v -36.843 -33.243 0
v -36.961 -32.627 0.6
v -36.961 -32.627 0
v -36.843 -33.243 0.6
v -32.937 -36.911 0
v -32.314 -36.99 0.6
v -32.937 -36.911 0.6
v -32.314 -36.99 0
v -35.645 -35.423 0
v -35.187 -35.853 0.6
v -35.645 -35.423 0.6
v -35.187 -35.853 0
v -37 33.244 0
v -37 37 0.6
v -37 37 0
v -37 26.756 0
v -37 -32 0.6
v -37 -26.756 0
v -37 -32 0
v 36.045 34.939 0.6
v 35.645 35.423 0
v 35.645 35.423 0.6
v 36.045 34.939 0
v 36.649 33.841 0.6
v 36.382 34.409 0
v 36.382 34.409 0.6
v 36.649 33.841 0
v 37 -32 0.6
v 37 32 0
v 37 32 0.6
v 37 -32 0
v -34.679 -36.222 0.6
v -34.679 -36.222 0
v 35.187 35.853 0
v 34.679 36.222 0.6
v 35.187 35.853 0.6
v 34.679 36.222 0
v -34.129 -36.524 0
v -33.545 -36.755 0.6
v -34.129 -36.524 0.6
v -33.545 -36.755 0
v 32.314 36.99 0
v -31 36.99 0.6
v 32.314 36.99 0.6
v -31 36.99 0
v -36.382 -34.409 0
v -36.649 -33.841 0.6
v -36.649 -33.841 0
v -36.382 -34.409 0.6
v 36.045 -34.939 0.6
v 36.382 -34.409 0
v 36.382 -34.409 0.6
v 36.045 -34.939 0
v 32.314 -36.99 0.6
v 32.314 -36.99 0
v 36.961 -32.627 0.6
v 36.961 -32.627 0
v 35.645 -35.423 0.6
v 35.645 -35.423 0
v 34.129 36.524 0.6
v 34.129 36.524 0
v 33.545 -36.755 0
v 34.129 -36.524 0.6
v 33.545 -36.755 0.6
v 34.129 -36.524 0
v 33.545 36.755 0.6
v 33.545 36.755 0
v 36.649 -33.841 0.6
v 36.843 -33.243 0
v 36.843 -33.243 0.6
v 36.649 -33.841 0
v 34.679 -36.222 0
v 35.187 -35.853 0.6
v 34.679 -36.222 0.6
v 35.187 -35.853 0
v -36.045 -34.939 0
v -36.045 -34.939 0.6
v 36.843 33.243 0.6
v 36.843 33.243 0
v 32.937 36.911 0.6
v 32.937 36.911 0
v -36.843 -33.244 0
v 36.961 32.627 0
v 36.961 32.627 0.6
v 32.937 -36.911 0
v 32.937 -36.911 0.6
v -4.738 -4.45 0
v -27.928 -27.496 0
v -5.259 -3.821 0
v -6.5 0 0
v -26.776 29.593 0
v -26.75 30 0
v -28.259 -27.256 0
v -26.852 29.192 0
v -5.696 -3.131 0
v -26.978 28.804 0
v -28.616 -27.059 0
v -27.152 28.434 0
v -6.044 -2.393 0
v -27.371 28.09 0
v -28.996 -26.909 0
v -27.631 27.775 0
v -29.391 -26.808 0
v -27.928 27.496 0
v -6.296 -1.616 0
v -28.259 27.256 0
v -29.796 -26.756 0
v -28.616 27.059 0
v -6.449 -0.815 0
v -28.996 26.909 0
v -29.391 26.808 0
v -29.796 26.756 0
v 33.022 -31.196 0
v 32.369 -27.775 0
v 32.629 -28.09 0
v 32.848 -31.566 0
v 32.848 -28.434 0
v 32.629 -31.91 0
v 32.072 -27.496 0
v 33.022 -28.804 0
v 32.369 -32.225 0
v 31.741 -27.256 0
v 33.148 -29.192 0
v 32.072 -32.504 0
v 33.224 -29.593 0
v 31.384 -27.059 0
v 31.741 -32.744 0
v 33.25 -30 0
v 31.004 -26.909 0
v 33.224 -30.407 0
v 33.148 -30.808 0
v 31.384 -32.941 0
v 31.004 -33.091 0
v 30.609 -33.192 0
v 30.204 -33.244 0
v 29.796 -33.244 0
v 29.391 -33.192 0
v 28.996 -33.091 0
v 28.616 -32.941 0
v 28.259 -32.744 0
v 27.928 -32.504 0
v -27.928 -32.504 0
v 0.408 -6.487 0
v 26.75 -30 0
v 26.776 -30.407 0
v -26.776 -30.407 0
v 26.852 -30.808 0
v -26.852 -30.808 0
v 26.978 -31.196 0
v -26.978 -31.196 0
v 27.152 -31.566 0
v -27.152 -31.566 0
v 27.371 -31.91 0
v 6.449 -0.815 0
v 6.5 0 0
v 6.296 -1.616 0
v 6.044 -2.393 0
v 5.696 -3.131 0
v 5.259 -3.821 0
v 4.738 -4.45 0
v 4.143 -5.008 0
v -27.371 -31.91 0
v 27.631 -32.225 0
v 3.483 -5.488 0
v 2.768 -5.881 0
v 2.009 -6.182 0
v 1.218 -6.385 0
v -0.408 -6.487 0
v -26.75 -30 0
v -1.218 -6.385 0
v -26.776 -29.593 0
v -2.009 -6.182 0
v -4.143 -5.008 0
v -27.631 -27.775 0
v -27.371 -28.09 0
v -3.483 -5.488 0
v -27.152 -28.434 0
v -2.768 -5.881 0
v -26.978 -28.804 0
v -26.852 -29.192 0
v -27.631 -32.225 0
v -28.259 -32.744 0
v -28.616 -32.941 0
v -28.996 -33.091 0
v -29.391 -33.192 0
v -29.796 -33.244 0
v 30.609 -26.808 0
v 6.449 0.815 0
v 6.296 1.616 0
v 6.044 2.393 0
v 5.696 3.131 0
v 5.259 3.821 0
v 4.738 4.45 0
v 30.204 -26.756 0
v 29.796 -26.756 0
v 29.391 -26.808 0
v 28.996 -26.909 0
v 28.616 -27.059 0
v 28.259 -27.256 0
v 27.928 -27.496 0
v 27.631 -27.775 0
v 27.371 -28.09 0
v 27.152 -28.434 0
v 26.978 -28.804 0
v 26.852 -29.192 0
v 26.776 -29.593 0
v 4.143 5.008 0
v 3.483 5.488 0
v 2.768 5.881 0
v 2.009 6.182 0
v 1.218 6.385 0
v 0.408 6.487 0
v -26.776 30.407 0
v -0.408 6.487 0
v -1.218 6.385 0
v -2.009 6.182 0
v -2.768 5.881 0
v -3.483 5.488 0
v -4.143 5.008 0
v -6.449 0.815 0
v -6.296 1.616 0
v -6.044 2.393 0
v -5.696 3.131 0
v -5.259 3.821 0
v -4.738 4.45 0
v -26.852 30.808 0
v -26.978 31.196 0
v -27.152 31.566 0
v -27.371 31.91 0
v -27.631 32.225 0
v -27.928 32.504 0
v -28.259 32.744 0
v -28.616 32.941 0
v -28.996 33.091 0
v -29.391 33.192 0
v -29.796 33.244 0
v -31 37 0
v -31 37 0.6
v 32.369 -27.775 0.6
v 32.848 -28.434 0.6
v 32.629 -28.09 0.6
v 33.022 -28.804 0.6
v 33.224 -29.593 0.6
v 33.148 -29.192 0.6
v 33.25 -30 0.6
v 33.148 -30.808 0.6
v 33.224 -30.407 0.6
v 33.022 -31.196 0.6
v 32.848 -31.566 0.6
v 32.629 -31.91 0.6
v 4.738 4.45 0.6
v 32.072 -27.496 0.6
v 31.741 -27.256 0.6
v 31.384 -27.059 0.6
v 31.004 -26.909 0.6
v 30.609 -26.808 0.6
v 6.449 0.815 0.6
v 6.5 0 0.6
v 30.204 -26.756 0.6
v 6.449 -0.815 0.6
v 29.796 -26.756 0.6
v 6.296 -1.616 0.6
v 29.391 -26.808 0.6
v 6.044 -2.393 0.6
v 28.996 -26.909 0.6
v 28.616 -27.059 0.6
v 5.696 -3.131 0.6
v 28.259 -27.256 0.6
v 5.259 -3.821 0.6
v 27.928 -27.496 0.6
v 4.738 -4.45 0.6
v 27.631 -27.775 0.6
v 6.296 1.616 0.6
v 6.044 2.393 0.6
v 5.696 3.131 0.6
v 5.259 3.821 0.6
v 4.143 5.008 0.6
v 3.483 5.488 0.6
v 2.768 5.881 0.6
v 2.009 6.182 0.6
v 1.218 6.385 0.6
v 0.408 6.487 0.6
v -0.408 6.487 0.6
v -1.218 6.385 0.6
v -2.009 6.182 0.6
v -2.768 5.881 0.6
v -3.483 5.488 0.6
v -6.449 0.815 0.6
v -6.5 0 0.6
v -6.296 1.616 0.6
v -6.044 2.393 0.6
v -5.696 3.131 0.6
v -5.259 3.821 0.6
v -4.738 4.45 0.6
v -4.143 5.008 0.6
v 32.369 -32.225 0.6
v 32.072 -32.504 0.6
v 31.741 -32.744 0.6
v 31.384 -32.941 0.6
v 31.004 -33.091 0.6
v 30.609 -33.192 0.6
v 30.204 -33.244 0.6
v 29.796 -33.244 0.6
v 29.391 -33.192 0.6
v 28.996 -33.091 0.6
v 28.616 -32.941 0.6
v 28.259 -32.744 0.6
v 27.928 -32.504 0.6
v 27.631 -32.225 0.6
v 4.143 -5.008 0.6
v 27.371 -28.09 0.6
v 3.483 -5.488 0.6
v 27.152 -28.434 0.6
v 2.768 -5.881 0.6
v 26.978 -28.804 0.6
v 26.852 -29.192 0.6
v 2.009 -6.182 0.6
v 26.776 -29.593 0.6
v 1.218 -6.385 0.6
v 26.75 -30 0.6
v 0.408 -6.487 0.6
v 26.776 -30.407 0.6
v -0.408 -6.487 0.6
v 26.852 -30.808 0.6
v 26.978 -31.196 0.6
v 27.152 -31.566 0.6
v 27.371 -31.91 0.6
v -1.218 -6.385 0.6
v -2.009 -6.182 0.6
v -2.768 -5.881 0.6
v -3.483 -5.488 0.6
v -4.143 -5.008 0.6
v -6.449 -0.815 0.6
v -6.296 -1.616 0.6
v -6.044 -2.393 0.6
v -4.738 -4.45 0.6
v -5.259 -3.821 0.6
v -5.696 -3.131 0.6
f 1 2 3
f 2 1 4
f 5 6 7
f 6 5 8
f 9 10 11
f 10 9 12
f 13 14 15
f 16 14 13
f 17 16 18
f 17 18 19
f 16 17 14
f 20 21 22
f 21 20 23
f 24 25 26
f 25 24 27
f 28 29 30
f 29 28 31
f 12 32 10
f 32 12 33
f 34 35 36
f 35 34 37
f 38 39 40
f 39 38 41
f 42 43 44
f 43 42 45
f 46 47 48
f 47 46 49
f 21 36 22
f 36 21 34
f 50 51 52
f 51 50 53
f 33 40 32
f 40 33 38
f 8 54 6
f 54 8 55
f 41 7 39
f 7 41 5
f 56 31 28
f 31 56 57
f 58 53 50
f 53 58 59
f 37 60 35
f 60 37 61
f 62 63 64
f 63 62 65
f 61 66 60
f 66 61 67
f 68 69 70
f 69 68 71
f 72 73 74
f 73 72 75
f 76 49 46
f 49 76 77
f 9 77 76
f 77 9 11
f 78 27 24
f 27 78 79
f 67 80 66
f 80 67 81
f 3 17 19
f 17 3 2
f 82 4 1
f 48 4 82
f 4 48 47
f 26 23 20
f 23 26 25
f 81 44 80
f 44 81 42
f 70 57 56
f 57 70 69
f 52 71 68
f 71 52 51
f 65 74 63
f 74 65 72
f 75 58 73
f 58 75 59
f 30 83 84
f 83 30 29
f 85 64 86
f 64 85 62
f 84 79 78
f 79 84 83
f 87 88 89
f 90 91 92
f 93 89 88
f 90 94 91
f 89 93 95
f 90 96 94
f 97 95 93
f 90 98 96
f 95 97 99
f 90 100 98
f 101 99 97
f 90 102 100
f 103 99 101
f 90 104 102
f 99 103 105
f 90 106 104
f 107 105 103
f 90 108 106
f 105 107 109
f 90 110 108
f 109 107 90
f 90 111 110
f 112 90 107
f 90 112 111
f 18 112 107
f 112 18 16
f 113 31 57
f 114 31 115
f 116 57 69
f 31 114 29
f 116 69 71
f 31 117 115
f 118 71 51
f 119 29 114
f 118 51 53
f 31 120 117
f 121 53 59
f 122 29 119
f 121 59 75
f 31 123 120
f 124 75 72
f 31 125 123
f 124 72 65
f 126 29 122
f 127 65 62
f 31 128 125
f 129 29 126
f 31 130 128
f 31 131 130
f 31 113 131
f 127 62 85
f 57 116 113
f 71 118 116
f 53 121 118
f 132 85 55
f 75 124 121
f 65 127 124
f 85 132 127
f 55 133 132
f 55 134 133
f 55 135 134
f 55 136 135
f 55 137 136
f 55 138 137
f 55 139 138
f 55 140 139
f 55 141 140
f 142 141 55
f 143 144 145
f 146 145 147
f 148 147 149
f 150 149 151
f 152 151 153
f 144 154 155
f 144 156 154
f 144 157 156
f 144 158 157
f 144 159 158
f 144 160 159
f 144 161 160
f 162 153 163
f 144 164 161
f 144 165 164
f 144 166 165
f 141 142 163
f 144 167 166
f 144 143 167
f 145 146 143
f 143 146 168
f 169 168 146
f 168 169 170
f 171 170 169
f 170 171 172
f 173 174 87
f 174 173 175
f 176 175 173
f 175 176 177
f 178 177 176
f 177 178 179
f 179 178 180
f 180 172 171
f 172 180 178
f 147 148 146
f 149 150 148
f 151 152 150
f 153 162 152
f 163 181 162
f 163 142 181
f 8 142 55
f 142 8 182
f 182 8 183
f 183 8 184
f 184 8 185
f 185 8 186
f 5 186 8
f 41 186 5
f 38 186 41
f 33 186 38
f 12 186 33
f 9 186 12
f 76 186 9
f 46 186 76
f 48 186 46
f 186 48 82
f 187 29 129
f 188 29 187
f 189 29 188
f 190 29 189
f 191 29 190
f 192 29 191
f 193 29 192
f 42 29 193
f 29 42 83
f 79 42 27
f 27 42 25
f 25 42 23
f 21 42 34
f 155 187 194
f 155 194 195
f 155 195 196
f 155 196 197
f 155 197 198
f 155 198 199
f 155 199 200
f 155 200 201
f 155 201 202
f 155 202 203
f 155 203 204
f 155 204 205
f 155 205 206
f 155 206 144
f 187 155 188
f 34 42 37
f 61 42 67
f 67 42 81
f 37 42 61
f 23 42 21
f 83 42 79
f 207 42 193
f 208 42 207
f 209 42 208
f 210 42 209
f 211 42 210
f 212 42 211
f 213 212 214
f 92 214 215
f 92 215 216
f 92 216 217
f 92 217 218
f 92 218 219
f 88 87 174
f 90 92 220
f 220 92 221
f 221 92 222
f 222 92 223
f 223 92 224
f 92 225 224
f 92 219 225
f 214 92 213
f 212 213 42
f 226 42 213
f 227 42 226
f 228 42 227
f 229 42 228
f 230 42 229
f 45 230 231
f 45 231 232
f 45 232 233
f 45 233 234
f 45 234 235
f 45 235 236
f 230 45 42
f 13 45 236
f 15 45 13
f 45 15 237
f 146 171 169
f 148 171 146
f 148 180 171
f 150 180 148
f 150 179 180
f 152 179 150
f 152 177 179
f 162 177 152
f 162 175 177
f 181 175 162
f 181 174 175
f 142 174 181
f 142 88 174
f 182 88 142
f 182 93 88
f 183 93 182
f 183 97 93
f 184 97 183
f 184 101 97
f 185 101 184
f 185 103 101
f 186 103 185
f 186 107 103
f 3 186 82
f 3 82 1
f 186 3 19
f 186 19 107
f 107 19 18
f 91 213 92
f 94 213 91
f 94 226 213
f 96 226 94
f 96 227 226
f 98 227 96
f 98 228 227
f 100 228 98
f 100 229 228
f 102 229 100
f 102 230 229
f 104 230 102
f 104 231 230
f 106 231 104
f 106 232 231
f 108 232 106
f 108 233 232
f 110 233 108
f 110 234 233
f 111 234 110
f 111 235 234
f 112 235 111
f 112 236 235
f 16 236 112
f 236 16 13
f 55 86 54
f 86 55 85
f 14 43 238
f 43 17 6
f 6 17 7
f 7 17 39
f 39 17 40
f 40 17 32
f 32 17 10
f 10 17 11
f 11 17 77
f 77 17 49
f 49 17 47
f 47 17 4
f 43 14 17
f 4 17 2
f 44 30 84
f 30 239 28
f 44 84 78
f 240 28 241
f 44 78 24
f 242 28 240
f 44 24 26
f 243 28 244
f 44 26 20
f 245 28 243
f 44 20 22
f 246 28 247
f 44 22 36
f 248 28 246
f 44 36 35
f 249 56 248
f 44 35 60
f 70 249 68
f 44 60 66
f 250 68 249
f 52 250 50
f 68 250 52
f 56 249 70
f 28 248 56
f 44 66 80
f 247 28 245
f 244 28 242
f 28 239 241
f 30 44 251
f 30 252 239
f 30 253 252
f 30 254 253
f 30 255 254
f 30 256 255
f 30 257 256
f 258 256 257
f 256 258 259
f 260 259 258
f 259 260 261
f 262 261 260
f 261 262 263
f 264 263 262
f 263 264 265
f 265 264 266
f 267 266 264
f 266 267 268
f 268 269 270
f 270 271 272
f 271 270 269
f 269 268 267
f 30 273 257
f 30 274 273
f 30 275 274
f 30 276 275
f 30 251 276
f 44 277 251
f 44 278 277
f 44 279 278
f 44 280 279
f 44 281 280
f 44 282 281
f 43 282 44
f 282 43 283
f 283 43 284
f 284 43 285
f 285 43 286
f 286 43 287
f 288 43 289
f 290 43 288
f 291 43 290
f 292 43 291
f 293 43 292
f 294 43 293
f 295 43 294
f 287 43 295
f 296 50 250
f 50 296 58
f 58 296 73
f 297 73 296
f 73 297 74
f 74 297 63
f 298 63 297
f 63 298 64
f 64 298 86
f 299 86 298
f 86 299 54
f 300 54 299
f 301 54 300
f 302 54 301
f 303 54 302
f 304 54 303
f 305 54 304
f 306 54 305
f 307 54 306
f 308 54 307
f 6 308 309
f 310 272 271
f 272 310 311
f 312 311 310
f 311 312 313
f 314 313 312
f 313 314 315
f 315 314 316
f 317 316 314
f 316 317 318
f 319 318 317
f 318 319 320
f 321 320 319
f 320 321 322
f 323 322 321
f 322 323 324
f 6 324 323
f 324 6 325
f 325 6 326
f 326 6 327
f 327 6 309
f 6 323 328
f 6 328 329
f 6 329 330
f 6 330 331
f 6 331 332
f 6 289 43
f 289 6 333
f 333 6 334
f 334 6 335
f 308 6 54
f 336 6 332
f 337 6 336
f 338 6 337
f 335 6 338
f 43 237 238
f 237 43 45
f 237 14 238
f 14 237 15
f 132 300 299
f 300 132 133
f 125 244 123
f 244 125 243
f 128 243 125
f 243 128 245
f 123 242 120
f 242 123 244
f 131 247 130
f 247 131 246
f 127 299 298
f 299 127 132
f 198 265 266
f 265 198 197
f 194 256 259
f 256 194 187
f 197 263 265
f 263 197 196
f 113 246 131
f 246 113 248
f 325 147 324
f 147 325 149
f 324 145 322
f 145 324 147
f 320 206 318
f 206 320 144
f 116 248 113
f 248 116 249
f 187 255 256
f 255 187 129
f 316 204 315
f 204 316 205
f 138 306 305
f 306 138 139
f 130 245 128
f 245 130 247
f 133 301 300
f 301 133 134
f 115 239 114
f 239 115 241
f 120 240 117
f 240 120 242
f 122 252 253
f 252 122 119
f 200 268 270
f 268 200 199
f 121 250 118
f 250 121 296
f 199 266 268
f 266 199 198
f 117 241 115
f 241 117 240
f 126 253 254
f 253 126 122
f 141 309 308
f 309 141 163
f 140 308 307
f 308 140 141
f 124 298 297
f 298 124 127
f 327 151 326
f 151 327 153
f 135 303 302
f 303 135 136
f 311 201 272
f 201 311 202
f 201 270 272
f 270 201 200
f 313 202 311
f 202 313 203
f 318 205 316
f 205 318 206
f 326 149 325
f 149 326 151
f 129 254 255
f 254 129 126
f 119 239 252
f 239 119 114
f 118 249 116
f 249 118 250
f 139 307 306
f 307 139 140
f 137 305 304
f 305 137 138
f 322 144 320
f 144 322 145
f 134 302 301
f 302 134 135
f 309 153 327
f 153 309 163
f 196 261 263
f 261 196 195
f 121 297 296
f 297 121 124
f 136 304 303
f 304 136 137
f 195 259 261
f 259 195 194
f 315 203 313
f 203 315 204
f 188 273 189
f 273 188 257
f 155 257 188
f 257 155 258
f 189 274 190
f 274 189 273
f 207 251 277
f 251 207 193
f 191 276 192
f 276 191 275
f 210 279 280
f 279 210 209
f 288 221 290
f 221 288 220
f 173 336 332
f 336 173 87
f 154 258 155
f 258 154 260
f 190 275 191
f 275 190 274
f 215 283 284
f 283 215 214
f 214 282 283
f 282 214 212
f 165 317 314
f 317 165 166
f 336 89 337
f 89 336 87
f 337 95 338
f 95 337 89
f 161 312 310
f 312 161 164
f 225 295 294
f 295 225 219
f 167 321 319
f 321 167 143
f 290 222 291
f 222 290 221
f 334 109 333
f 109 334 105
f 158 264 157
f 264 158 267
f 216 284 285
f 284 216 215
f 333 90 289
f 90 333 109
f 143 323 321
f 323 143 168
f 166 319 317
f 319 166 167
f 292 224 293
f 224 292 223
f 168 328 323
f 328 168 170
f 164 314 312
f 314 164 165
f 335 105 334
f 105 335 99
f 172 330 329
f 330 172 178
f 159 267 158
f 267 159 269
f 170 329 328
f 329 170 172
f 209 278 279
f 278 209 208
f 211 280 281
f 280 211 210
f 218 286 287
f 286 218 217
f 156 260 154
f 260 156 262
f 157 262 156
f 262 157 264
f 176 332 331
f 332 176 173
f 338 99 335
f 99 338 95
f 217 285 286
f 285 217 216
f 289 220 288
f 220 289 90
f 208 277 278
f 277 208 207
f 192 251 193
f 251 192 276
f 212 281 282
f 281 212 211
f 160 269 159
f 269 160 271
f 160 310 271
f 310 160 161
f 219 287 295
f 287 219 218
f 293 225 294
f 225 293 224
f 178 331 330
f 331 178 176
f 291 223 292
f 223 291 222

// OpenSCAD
$fn = 50;


difference() {
	union() {
		hull() {
			translate(v = [-32.0000000000, 32.0000000000, 0]) {
				cylinder(h = 0.6000000000, r = 5);
			}
			translate(v = [32.0000000000, 32.0000000000, 0]) {
				cylinder(h = 0.6000000000, r = 5);
			}
			translate(v = [-32.0000000000, -32.0000000000, 0]) {
				cylinder(h = 0.6000000000, r = 5);
			}
			translate(v = [32.0000000000, -32.0000000000, 0]) {
				cylinder(h = 0.6000000000, r = 5);
			}
		}
		translate(v = [-37.0000000000, 31.0000000000, 0]) {
			cube(size = [6, 6, 0.6000000000]);
		}
	}
	union() {
		translate(v = [-37.5000000000, -30.0000000000, -250.0000000000]) {
			rotate(a = [0, 0, 0]) {
				difference() {
					union() {
						hull() {
							translate(v = [7.5000000000, 0, 0]) {
								cylinder(h = 250, r = 3.2500000000, r1 = 3.2500000000, r2 = 3.2500000000);
							}
							translate(v = [-7.5000000000, 0, 0]) {
								cylinder(h = 250, r = 3.2500000000, r1 = 3.2500000000, r2 = 3.2500000000);
							}
						}
					}
					union();
				}
			}
		}
		translate(v = [-37.5000000000, 30.0000000000, -250.0000000000]) {
			rotate(a = [0, 0, 0]) {
				difference() {
					union() {
						hull() {
							translate(v = [7.5000000000, 0, 0]) {
								cylinder(h = 250, r = 3.2500000000, r1 = 3.2500000000, r2 = 3.2500000000);
							}
							translate(v = [-7.5000000000, 0, 0]) {
								cylinder(h = 250, r = 3.2500000000, r1 = 3.2500000000, r2 = 3.2500000000);
							}
						}
					}
					union();
				}
			}
		}
		translate(v = [30.0000000000, -30.0000000000, 0]) {
			cylinder(h = 100, r = 3.2500000000);
		}
		cylinder(h = 0.6000000000, r = 6.5000000000);
	}
}
